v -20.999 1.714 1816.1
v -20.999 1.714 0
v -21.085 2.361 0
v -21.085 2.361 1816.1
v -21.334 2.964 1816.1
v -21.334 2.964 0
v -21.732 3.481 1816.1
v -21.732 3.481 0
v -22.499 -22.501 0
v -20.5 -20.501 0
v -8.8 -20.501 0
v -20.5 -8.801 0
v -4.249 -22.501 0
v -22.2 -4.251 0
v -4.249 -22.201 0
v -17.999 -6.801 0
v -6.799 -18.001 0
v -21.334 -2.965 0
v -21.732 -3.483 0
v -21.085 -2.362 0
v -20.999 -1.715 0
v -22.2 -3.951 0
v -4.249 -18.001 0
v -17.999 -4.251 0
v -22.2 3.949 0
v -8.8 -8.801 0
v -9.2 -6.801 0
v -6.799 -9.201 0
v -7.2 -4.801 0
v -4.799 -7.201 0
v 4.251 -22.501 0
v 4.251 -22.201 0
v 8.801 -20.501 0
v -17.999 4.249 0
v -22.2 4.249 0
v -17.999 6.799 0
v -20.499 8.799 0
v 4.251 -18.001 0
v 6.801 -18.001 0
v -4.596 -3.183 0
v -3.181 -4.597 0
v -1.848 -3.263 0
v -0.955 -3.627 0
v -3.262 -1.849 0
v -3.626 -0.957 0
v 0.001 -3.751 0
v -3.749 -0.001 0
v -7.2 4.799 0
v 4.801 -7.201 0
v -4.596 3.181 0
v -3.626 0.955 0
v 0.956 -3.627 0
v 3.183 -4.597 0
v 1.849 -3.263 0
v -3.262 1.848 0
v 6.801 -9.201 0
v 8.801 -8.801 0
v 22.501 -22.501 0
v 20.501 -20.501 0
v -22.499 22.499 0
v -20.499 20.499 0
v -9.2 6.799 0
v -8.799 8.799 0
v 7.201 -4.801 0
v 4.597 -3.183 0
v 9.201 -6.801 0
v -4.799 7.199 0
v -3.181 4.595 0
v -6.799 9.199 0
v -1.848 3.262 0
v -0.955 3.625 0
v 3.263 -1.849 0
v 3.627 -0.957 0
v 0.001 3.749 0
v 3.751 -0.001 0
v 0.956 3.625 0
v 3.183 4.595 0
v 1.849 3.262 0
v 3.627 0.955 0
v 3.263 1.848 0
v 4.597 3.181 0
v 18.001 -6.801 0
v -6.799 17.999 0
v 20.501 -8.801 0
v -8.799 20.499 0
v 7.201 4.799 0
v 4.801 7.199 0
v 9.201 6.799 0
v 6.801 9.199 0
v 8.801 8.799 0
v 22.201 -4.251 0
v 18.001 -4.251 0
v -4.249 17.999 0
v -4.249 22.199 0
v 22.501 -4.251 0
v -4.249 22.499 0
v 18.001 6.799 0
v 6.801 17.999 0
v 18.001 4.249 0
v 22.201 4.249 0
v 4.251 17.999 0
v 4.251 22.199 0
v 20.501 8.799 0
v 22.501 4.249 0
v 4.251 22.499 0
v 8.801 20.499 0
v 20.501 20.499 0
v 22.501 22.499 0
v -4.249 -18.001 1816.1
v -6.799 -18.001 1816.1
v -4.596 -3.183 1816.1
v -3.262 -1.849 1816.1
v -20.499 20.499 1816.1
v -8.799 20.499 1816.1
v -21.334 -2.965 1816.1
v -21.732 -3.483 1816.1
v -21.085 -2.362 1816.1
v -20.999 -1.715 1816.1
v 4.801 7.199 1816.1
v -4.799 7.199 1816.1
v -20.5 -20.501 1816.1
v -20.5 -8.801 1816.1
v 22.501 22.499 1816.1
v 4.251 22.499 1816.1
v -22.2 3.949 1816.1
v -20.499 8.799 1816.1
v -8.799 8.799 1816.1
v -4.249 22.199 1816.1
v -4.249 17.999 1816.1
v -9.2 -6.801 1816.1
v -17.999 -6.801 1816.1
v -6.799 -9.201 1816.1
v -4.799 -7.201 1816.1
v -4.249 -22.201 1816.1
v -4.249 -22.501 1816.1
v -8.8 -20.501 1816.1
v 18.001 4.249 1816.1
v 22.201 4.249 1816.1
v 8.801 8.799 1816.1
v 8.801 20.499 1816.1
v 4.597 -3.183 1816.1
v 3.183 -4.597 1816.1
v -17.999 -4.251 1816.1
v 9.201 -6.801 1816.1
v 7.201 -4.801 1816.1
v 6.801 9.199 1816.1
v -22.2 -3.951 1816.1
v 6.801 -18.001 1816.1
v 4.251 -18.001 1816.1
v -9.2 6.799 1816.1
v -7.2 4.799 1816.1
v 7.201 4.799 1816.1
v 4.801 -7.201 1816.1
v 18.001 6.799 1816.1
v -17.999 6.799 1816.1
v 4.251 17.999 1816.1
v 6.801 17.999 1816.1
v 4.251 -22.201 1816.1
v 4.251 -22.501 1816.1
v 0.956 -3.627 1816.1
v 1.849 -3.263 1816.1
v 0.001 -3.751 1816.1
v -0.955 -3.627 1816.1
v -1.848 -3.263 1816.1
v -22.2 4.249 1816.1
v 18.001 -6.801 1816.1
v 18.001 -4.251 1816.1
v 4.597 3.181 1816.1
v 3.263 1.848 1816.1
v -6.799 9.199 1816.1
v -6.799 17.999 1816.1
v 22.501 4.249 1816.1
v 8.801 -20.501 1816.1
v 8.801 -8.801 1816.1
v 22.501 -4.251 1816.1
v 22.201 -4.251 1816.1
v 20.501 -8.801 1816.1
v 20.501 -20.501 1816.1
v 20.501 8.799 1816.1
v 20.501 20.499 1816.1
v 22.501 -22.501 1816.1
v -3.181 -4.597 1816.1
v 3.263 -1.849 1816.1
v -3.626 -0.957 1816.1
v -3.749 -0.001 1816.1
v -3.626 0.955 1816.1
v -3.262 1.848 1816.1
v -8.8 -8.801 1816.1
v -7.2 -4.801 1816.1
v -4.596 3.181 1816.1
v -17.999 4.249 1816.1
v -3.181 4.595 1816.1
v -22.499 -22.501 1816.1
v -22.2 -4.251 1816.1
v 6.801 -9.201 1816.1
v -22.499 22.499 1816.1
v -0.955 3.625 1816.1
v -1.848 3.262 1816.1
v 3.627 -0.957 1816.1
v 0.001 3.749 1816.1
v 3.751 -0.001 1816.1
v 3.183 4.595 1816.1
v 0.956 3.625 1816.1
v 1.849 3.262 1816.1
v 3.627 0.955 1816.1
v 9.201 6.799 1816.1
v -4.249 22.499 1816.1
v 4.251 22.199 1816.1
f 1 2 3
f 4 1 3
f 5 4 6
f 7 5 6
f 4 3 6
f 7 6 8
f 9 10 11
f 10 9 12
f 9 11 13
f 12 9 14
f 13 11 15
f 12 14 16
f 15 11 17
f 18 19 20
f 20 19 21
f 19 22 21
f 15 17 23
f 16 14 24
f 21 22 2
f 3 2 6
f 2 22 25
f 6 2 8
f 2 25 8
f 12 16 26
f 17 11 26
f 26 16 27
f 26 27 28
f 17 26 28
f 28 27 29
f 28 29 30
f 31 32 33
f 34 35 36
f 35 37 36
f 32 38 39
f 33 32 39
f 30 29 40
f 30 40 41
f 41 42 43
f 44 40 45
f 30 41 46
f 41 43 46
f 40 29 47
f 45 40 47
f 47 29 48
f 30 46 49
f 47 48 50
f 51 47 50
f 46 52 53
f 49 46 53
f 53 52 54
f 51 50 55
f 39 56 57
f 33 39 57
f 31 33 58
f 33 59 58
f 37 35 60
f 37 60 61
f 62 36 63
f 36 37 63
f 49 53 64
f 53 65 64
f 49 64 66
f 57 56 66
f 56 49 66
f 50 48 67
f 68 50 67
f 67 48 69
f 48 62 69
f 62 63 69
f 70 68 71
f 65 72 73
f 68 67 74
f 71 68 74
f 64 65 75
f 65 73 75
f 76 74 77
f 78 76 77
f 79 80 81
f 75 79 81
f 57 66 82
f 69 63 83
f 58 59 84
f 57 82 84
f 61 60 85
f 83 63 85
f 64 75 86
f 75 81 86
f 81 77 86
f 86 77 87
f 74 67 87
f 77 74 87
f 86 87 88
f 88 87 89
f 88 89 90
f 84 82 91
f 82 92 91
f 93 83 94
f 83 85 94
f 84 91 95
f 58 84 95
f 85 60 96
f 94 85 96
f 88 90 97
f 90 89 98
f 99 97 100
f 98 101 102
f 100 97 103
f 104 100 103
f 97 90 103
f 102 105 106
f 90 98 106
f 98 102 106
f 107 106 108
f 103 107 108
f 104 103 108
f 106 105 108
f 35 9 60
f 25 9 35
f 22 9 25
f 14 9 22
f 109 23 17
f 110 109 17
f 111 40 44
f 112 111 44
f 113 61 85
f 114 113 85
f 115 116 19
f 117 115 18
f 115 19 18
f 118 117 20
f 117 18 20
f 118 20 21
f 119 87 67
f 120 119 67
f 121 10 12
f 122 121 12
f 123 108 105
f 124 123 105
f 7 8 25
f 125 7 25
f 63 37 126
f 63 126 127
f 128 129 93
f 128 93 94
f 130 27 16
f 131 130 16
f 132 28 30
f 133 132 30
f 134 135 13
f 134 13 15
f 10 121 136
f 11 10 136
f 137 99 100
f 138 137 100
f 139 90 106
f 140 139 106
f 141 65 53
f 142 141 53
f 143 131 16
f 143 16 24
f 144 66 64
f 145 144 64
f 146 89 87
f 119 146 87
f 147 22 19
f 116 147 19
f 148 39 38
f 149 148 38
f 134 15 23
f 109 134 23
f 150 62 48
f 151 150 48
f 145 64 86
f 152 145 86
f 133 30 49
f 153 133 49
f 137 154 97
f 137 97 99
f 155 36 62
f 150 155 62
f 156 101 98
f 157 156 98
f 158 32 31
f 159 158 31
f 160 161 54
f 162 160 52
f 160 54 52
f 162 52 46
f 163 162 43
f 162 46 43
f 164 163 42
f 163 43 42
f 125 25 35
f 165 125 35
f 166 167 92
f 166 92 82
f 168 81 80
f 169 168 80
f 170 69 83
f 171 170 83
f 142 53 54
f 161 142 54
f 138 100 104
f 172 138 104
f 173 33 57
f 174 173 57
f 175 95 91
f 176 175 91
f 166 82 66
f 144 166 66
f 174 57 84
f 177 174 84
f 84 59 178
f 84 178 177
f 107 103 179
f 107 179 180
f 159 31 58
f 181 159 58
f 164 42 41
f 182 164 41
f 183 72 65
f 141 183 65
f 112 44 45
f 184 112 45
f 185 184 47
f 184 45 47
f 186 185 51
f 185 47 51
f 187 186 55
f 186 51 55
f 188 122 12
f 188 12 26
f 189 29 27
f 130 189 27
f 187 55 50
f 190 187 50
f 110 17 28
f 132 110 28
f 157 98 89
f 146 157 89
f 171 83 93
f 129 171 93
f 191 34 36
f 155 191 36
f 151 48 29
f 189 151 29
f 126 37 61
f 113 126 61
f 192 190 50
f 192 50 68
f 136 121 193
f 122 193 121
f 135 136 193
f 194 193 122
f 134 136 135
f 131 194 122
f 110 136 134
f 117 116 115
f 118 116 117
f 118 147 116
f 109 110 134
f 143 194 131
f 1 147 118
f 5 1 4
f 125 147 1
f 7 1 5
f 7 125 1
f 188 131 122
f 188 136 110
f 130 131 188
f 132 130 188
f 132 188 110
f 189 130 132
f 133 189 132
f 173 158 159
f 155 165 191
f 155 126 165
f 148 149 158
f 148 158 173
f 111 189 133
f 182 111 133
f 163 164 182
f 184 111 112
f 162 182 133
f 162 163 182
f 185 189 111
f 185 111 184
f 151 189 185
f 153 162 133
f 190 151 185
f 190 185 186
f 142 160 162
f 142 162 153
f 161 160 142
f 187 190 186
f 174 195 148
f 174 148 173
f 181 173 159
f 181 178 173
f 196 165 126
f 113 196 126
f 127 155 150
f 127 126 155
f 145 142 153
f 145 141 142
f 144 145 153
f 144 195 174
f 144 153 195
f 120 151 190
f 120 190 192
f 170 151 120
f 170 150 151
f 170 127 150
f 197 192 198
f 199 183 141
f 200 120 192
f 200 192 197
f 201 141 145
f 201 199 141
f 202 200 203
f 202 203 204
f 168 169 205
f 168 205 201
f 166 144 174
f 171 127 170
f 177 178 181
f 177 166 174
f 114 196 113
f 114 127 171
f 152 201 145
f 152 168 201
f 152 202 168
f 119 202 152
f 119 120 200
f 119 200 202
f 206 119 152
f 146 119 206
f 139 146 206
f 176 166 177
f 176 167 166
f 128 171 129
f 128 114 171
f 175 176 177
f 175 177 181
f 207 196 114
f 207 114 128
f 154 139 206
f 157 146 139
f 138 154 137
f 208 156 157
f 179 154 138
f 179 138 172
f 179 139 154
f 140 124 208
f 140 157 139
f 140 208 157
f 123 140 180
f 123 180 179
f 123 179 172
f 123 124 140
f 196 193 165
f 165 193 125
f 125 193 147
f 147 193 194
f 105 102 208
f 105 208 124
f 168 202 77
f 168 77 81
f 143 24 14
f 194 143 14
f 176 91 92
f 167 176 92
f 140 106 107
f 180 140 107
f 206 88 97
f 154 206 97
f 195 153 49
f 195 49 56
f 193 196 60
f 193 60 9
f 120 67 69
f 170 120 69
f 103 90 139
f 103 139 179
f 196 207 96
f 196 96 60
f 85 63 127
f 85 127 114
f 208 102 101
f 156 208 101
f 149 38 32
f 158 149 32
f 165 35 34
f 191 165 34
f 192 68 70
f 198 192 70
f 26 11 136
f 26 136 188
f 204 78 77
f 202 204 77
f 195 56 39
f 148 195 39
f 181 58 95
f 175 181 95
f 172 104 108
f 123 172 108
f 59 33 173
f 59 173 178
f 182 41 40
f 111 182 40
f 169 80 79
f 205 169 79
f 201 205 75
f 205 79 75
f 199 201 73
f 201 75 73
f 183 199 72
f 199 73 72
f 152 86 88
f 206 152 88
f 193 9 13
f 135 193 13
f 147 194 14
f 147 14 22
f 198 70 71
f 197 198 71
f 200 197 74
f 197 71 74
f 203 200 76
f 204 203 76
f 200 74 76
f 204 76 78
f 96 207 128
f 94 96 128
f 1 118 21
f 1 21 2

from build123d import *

# Parameters (mm, degrees)
SKETCH1_W           = 11.699975178
SKETCH1_H           = 11.699996949
SKETCH1_W_2         = 11.699990436
SKETCH1_H_2         = 11.699981689
SKETCH1_W_3         = 11.699990437
SKETCH1_H_3         = 11.699975177
SKETCH1_W_4         = 11.699981689
SKETCH1_H_4         = 11.699990436
BOSS_EXTRUDE1_DEPTH = 1816.1
CUT_EXTRUDE1_REACH  = 1818.379


with BuildPart() as part:
    # Sketch1 → Boss-Extrude1 (new body)
    with BuildSketch(Plane.XY):
        Polygon((22.500515052, 22.499297556), (-22.499484399, 22.499298105), (-22.499484948, -22.500701346), (-4.249491942, -22.500701568), (-4.249491942, -22.200733242), (-4.24949208, -18.000719999), (-6.799479919, -18.000719999), (-6.799480207, -9.200732353), (-4.799480391, -7.200732362), (4.800525817, -7.200732047), (6.8005258, -9.200731855), (6.800526088, -18.000720263), (4.250507877, -18.000720263), (4.250508015, -22.200733153), (4.250508015, -22.500701672), (22.500514502, -22.500701895), (22.500514725, -4.250714302), (22.200520351, -4.250714302), (18.000507108, -4.25071444), (18.000507108, -6.800702279), (9.200519462, -6.800702567), (7.200519471, -4.800702751), (7.200519156, 4.799303458), (9.200518964, 6.79930344), (18.000507424, 6.799303729), (18.000507424, 4.249285514), (22.200520261, 4.249285652), (22.500514829, 4.249285652), align=None)
        with BuildLine():
            Line((-4.249491247, 17.999291576), (-4.249490956, 22.199304807))
            Line((-4.249490956, 22.199304807), (-3.949472548, 22.199304807))
            Line((-3.949472548, 22.199304807), (-3.481695222, 21.73152644))
            ThreePointArc((-3.481695222, 21.73152644), (-2.670636178, 21.189593132), (-1.713926324, 20.999291428))
            Line((-1.713926324, 20.999291428), (1.714975167, 20.999291428))
            ThreePointArc((1.714975167, 20.999291428), (2.671722509, 21.189608628), (3.482801459, 21.731583767))
            Line((3.482801459, 21.731583767), (3.950490798, 22.199304487))
            Line((3.950490798, 22.199304487), (4.250509108, 22.199304487))
            Line((4.250509108, 22.199304487), (4.250508817, 17.999291575))
            Line((4.250508817, 17.999291575), (6.800527063, 17.999291575))
            Line((6.800527063, 17.999291575), (6.800526453, 9.199302988))
            Line((6.800526453, 9.199302988), (4.800526064, 7.199302969))
            Line((4.800526064, 7.199302969), (-4.799479817, 7.199303635))
            Line((-4.799479817, 7.199303635), (-6.799479854, 9.199304042))
            Line((-6.799479854, 9.199304042), (-6.799479244, 17.999291576))
            Line((-6.799479244, 17.999291576), (-4.249491247, 17.999291576))
        make_face(mode=Mode.SUBTRACT)
        with BuildLine():
            Line((-17.99949762, -4.250714253), (-22.199510799, -4.250714391))
            Line((-22.199510799, -4.250714391), (-22.199510799, -3.950696126))
            Line((-22.199510799, -3.950696126), (-21.731790056, -3.48300681))
            ThreePointArc((-21.731790056, -3.48300681), (-21.189814855, -2.671927844), (-20.999497617, -1.71518046))
            Line((-20.999497617, -1.71518046), (-20.999497617, 1.713721031))
            ThreePointArc((-20.999497617, 1.713721031), (-21.189799286, 2.670430863), (-21.731732544, 3.481489907))
            Line((-21.731732544, 3.481489907), (-22.199510888, 3.949267256))
            Line((-22.199510888, 3.949267256), (-22.199510888, 4.249285566))
            Line((-22.199510888, 4.249285566), (-17.999497356, 4.249285704))
            Line((-17.999497356, 4.249285704), (-17.999497356, 6.79927354))
            Line((-17.999497356, 6.79927354), (-9.199509947, 6.799273828))
            Line((-9.199509947, 6.799273828), (-7.199509956, 4.799274012))
            Line((-7.199509956, 4.799274012), (-7.199509641, -4.800732197))
            Line((-7.199509641, -4.800732197), (-9.199509449, -6.800732179))
            Line((-9.199509449, -6.800732179), (-17.99949762, -6.800732468))
            Line((-17.99949762, -6.800732468), (-17.99949762, -4.250714253))
        make_face(mode=Mode.SUBTRACT)
        with Locations((-14.649542346, -14.650709384)):
            Rectangle(SKETCH1_W, SKETCH1_H, mode=Mode.SUBTRACT)
        with Locations((14.65050626, -14.650767962)):
            Rectangle(SKETCH1_W_2, SKETCH1_H_2, mode=Mode.SUBTRACT)
        with BuildLine():
            Line((-3.181457266, -4.596908447), (-4.595670829, -3.182694885))
            Line((-4.595670829, -3.182694885), (-3.26221457, -1.849238626))
            ThreePointArc((-3.26221457, -1.849238626), (-3.749476751, -0.00071437), (-3.26221457, 1.847809887))
            Line((-3.26221457, 1.847809887), (-4.595670829, 3.181266146))
            Line((-4.595670829, 3.181266146), (-3.181457266, 4.595479708))
            Line((-3.181457266, 4.595479708), (-1.848001007, 3.262023449))
            ThreePointArc((-1.848001007, 3.262023449), (0.000523249, 3.74928563), (1.849047505, 3.262023449))
            Line((1.849047505, 3.262023449), (3.182503764, 4.595479708))
            Line((3.182503764, 4.595479708), (4.596717327, 3.181266146))
            Line((4.596717327, 3.181266146), (3.263261068, 1.847809887))
            ThreePointArc((3.263261068, 1.847809887), (3.750523249, -0.00071437), (3.263261068, -1.849238626))
            Line((3.263261068, -1.849238626), (4.596717327, -3.182694885))
            Line((4.596717327, -3.182694885), (3.182503764, -4.596908447))
            Line((3.182503764, -4.596908447), (1.849047505, -3.263452188))
            ThreePointArc((1.849047505, -3.263452188), (0.000523249, -3.75071437), (-1.848001007, -3.263452188))
            Line((-1.848001007, -3.263452188), (-3.181457266, -4.596908447))
        make_face(mode=Mode.SUBTRACT)
        with Locations((-14.64949028, 14.649335967)):
            Rectangle(SKETCH1_W_3, SKETCH1_H_3, mode=Mode.SUBTRACT)
        with Locations((14.650561583, 14.6492839)):
            Rectangle(SKETCH1_W_4, SKETCH1_H_4, mode=Mode.SUBTRACT)
    extrude(amount=BOSS_EXTRUDE1_DEPTH)

    # Sketch1<4> → Cut-Extrude1 (cut, up to next)
    with BuildSketch(Plane.XY, mode=Mode.PRIVATE) as cut_extrude1_sk1:
        with BuildLine():
            Line((-4.249490956, 22.499297883), (-4.249490956, 22.199304807))
            Line((-4.249490956, 22.199304807), (-3.949472548, 22.199304807))
            Line((-3.949472548, 22.199304807), (-3.481695222, 21.73152644))
            ThreePointArc((-3.481695222, 21.73152644), (-2.670636178, 21.189593132), (-1.713926324, 20.999291428))
            Line((-1.713926324, 20.999291428), (1.714975167, 20.999291428))
            ThreePointArc((1.714975167, 20.999291428), (2.671722509, 21.189608628), (3.482801459, 21.731583767))
            Line((3.482801459, 21.731583767), (3.950490798, 22.199304487))
            Line((3.950490798, 22.199304487), (4.250509108, 22.199304487))
            Line((4.250509108, 22.199304487), (4.250509108, 22.499297779))
            Line((4.250509108, 22.499297779), (-4.249490956, 22.499297883))
        make_face()
    cut_extrude1_tool1 = extrude(cut_extrude1_sk1.sketch, amount=CUT_EXTRUDE1_REACH, mode=Mode.PRIVATE) & part.part
    add(cut_extrude1_tool1.solids().sort_by_distance((0.000518, 21.824215, 0))[0], mode=Mode.SUBTRACT)


solid = part.part
